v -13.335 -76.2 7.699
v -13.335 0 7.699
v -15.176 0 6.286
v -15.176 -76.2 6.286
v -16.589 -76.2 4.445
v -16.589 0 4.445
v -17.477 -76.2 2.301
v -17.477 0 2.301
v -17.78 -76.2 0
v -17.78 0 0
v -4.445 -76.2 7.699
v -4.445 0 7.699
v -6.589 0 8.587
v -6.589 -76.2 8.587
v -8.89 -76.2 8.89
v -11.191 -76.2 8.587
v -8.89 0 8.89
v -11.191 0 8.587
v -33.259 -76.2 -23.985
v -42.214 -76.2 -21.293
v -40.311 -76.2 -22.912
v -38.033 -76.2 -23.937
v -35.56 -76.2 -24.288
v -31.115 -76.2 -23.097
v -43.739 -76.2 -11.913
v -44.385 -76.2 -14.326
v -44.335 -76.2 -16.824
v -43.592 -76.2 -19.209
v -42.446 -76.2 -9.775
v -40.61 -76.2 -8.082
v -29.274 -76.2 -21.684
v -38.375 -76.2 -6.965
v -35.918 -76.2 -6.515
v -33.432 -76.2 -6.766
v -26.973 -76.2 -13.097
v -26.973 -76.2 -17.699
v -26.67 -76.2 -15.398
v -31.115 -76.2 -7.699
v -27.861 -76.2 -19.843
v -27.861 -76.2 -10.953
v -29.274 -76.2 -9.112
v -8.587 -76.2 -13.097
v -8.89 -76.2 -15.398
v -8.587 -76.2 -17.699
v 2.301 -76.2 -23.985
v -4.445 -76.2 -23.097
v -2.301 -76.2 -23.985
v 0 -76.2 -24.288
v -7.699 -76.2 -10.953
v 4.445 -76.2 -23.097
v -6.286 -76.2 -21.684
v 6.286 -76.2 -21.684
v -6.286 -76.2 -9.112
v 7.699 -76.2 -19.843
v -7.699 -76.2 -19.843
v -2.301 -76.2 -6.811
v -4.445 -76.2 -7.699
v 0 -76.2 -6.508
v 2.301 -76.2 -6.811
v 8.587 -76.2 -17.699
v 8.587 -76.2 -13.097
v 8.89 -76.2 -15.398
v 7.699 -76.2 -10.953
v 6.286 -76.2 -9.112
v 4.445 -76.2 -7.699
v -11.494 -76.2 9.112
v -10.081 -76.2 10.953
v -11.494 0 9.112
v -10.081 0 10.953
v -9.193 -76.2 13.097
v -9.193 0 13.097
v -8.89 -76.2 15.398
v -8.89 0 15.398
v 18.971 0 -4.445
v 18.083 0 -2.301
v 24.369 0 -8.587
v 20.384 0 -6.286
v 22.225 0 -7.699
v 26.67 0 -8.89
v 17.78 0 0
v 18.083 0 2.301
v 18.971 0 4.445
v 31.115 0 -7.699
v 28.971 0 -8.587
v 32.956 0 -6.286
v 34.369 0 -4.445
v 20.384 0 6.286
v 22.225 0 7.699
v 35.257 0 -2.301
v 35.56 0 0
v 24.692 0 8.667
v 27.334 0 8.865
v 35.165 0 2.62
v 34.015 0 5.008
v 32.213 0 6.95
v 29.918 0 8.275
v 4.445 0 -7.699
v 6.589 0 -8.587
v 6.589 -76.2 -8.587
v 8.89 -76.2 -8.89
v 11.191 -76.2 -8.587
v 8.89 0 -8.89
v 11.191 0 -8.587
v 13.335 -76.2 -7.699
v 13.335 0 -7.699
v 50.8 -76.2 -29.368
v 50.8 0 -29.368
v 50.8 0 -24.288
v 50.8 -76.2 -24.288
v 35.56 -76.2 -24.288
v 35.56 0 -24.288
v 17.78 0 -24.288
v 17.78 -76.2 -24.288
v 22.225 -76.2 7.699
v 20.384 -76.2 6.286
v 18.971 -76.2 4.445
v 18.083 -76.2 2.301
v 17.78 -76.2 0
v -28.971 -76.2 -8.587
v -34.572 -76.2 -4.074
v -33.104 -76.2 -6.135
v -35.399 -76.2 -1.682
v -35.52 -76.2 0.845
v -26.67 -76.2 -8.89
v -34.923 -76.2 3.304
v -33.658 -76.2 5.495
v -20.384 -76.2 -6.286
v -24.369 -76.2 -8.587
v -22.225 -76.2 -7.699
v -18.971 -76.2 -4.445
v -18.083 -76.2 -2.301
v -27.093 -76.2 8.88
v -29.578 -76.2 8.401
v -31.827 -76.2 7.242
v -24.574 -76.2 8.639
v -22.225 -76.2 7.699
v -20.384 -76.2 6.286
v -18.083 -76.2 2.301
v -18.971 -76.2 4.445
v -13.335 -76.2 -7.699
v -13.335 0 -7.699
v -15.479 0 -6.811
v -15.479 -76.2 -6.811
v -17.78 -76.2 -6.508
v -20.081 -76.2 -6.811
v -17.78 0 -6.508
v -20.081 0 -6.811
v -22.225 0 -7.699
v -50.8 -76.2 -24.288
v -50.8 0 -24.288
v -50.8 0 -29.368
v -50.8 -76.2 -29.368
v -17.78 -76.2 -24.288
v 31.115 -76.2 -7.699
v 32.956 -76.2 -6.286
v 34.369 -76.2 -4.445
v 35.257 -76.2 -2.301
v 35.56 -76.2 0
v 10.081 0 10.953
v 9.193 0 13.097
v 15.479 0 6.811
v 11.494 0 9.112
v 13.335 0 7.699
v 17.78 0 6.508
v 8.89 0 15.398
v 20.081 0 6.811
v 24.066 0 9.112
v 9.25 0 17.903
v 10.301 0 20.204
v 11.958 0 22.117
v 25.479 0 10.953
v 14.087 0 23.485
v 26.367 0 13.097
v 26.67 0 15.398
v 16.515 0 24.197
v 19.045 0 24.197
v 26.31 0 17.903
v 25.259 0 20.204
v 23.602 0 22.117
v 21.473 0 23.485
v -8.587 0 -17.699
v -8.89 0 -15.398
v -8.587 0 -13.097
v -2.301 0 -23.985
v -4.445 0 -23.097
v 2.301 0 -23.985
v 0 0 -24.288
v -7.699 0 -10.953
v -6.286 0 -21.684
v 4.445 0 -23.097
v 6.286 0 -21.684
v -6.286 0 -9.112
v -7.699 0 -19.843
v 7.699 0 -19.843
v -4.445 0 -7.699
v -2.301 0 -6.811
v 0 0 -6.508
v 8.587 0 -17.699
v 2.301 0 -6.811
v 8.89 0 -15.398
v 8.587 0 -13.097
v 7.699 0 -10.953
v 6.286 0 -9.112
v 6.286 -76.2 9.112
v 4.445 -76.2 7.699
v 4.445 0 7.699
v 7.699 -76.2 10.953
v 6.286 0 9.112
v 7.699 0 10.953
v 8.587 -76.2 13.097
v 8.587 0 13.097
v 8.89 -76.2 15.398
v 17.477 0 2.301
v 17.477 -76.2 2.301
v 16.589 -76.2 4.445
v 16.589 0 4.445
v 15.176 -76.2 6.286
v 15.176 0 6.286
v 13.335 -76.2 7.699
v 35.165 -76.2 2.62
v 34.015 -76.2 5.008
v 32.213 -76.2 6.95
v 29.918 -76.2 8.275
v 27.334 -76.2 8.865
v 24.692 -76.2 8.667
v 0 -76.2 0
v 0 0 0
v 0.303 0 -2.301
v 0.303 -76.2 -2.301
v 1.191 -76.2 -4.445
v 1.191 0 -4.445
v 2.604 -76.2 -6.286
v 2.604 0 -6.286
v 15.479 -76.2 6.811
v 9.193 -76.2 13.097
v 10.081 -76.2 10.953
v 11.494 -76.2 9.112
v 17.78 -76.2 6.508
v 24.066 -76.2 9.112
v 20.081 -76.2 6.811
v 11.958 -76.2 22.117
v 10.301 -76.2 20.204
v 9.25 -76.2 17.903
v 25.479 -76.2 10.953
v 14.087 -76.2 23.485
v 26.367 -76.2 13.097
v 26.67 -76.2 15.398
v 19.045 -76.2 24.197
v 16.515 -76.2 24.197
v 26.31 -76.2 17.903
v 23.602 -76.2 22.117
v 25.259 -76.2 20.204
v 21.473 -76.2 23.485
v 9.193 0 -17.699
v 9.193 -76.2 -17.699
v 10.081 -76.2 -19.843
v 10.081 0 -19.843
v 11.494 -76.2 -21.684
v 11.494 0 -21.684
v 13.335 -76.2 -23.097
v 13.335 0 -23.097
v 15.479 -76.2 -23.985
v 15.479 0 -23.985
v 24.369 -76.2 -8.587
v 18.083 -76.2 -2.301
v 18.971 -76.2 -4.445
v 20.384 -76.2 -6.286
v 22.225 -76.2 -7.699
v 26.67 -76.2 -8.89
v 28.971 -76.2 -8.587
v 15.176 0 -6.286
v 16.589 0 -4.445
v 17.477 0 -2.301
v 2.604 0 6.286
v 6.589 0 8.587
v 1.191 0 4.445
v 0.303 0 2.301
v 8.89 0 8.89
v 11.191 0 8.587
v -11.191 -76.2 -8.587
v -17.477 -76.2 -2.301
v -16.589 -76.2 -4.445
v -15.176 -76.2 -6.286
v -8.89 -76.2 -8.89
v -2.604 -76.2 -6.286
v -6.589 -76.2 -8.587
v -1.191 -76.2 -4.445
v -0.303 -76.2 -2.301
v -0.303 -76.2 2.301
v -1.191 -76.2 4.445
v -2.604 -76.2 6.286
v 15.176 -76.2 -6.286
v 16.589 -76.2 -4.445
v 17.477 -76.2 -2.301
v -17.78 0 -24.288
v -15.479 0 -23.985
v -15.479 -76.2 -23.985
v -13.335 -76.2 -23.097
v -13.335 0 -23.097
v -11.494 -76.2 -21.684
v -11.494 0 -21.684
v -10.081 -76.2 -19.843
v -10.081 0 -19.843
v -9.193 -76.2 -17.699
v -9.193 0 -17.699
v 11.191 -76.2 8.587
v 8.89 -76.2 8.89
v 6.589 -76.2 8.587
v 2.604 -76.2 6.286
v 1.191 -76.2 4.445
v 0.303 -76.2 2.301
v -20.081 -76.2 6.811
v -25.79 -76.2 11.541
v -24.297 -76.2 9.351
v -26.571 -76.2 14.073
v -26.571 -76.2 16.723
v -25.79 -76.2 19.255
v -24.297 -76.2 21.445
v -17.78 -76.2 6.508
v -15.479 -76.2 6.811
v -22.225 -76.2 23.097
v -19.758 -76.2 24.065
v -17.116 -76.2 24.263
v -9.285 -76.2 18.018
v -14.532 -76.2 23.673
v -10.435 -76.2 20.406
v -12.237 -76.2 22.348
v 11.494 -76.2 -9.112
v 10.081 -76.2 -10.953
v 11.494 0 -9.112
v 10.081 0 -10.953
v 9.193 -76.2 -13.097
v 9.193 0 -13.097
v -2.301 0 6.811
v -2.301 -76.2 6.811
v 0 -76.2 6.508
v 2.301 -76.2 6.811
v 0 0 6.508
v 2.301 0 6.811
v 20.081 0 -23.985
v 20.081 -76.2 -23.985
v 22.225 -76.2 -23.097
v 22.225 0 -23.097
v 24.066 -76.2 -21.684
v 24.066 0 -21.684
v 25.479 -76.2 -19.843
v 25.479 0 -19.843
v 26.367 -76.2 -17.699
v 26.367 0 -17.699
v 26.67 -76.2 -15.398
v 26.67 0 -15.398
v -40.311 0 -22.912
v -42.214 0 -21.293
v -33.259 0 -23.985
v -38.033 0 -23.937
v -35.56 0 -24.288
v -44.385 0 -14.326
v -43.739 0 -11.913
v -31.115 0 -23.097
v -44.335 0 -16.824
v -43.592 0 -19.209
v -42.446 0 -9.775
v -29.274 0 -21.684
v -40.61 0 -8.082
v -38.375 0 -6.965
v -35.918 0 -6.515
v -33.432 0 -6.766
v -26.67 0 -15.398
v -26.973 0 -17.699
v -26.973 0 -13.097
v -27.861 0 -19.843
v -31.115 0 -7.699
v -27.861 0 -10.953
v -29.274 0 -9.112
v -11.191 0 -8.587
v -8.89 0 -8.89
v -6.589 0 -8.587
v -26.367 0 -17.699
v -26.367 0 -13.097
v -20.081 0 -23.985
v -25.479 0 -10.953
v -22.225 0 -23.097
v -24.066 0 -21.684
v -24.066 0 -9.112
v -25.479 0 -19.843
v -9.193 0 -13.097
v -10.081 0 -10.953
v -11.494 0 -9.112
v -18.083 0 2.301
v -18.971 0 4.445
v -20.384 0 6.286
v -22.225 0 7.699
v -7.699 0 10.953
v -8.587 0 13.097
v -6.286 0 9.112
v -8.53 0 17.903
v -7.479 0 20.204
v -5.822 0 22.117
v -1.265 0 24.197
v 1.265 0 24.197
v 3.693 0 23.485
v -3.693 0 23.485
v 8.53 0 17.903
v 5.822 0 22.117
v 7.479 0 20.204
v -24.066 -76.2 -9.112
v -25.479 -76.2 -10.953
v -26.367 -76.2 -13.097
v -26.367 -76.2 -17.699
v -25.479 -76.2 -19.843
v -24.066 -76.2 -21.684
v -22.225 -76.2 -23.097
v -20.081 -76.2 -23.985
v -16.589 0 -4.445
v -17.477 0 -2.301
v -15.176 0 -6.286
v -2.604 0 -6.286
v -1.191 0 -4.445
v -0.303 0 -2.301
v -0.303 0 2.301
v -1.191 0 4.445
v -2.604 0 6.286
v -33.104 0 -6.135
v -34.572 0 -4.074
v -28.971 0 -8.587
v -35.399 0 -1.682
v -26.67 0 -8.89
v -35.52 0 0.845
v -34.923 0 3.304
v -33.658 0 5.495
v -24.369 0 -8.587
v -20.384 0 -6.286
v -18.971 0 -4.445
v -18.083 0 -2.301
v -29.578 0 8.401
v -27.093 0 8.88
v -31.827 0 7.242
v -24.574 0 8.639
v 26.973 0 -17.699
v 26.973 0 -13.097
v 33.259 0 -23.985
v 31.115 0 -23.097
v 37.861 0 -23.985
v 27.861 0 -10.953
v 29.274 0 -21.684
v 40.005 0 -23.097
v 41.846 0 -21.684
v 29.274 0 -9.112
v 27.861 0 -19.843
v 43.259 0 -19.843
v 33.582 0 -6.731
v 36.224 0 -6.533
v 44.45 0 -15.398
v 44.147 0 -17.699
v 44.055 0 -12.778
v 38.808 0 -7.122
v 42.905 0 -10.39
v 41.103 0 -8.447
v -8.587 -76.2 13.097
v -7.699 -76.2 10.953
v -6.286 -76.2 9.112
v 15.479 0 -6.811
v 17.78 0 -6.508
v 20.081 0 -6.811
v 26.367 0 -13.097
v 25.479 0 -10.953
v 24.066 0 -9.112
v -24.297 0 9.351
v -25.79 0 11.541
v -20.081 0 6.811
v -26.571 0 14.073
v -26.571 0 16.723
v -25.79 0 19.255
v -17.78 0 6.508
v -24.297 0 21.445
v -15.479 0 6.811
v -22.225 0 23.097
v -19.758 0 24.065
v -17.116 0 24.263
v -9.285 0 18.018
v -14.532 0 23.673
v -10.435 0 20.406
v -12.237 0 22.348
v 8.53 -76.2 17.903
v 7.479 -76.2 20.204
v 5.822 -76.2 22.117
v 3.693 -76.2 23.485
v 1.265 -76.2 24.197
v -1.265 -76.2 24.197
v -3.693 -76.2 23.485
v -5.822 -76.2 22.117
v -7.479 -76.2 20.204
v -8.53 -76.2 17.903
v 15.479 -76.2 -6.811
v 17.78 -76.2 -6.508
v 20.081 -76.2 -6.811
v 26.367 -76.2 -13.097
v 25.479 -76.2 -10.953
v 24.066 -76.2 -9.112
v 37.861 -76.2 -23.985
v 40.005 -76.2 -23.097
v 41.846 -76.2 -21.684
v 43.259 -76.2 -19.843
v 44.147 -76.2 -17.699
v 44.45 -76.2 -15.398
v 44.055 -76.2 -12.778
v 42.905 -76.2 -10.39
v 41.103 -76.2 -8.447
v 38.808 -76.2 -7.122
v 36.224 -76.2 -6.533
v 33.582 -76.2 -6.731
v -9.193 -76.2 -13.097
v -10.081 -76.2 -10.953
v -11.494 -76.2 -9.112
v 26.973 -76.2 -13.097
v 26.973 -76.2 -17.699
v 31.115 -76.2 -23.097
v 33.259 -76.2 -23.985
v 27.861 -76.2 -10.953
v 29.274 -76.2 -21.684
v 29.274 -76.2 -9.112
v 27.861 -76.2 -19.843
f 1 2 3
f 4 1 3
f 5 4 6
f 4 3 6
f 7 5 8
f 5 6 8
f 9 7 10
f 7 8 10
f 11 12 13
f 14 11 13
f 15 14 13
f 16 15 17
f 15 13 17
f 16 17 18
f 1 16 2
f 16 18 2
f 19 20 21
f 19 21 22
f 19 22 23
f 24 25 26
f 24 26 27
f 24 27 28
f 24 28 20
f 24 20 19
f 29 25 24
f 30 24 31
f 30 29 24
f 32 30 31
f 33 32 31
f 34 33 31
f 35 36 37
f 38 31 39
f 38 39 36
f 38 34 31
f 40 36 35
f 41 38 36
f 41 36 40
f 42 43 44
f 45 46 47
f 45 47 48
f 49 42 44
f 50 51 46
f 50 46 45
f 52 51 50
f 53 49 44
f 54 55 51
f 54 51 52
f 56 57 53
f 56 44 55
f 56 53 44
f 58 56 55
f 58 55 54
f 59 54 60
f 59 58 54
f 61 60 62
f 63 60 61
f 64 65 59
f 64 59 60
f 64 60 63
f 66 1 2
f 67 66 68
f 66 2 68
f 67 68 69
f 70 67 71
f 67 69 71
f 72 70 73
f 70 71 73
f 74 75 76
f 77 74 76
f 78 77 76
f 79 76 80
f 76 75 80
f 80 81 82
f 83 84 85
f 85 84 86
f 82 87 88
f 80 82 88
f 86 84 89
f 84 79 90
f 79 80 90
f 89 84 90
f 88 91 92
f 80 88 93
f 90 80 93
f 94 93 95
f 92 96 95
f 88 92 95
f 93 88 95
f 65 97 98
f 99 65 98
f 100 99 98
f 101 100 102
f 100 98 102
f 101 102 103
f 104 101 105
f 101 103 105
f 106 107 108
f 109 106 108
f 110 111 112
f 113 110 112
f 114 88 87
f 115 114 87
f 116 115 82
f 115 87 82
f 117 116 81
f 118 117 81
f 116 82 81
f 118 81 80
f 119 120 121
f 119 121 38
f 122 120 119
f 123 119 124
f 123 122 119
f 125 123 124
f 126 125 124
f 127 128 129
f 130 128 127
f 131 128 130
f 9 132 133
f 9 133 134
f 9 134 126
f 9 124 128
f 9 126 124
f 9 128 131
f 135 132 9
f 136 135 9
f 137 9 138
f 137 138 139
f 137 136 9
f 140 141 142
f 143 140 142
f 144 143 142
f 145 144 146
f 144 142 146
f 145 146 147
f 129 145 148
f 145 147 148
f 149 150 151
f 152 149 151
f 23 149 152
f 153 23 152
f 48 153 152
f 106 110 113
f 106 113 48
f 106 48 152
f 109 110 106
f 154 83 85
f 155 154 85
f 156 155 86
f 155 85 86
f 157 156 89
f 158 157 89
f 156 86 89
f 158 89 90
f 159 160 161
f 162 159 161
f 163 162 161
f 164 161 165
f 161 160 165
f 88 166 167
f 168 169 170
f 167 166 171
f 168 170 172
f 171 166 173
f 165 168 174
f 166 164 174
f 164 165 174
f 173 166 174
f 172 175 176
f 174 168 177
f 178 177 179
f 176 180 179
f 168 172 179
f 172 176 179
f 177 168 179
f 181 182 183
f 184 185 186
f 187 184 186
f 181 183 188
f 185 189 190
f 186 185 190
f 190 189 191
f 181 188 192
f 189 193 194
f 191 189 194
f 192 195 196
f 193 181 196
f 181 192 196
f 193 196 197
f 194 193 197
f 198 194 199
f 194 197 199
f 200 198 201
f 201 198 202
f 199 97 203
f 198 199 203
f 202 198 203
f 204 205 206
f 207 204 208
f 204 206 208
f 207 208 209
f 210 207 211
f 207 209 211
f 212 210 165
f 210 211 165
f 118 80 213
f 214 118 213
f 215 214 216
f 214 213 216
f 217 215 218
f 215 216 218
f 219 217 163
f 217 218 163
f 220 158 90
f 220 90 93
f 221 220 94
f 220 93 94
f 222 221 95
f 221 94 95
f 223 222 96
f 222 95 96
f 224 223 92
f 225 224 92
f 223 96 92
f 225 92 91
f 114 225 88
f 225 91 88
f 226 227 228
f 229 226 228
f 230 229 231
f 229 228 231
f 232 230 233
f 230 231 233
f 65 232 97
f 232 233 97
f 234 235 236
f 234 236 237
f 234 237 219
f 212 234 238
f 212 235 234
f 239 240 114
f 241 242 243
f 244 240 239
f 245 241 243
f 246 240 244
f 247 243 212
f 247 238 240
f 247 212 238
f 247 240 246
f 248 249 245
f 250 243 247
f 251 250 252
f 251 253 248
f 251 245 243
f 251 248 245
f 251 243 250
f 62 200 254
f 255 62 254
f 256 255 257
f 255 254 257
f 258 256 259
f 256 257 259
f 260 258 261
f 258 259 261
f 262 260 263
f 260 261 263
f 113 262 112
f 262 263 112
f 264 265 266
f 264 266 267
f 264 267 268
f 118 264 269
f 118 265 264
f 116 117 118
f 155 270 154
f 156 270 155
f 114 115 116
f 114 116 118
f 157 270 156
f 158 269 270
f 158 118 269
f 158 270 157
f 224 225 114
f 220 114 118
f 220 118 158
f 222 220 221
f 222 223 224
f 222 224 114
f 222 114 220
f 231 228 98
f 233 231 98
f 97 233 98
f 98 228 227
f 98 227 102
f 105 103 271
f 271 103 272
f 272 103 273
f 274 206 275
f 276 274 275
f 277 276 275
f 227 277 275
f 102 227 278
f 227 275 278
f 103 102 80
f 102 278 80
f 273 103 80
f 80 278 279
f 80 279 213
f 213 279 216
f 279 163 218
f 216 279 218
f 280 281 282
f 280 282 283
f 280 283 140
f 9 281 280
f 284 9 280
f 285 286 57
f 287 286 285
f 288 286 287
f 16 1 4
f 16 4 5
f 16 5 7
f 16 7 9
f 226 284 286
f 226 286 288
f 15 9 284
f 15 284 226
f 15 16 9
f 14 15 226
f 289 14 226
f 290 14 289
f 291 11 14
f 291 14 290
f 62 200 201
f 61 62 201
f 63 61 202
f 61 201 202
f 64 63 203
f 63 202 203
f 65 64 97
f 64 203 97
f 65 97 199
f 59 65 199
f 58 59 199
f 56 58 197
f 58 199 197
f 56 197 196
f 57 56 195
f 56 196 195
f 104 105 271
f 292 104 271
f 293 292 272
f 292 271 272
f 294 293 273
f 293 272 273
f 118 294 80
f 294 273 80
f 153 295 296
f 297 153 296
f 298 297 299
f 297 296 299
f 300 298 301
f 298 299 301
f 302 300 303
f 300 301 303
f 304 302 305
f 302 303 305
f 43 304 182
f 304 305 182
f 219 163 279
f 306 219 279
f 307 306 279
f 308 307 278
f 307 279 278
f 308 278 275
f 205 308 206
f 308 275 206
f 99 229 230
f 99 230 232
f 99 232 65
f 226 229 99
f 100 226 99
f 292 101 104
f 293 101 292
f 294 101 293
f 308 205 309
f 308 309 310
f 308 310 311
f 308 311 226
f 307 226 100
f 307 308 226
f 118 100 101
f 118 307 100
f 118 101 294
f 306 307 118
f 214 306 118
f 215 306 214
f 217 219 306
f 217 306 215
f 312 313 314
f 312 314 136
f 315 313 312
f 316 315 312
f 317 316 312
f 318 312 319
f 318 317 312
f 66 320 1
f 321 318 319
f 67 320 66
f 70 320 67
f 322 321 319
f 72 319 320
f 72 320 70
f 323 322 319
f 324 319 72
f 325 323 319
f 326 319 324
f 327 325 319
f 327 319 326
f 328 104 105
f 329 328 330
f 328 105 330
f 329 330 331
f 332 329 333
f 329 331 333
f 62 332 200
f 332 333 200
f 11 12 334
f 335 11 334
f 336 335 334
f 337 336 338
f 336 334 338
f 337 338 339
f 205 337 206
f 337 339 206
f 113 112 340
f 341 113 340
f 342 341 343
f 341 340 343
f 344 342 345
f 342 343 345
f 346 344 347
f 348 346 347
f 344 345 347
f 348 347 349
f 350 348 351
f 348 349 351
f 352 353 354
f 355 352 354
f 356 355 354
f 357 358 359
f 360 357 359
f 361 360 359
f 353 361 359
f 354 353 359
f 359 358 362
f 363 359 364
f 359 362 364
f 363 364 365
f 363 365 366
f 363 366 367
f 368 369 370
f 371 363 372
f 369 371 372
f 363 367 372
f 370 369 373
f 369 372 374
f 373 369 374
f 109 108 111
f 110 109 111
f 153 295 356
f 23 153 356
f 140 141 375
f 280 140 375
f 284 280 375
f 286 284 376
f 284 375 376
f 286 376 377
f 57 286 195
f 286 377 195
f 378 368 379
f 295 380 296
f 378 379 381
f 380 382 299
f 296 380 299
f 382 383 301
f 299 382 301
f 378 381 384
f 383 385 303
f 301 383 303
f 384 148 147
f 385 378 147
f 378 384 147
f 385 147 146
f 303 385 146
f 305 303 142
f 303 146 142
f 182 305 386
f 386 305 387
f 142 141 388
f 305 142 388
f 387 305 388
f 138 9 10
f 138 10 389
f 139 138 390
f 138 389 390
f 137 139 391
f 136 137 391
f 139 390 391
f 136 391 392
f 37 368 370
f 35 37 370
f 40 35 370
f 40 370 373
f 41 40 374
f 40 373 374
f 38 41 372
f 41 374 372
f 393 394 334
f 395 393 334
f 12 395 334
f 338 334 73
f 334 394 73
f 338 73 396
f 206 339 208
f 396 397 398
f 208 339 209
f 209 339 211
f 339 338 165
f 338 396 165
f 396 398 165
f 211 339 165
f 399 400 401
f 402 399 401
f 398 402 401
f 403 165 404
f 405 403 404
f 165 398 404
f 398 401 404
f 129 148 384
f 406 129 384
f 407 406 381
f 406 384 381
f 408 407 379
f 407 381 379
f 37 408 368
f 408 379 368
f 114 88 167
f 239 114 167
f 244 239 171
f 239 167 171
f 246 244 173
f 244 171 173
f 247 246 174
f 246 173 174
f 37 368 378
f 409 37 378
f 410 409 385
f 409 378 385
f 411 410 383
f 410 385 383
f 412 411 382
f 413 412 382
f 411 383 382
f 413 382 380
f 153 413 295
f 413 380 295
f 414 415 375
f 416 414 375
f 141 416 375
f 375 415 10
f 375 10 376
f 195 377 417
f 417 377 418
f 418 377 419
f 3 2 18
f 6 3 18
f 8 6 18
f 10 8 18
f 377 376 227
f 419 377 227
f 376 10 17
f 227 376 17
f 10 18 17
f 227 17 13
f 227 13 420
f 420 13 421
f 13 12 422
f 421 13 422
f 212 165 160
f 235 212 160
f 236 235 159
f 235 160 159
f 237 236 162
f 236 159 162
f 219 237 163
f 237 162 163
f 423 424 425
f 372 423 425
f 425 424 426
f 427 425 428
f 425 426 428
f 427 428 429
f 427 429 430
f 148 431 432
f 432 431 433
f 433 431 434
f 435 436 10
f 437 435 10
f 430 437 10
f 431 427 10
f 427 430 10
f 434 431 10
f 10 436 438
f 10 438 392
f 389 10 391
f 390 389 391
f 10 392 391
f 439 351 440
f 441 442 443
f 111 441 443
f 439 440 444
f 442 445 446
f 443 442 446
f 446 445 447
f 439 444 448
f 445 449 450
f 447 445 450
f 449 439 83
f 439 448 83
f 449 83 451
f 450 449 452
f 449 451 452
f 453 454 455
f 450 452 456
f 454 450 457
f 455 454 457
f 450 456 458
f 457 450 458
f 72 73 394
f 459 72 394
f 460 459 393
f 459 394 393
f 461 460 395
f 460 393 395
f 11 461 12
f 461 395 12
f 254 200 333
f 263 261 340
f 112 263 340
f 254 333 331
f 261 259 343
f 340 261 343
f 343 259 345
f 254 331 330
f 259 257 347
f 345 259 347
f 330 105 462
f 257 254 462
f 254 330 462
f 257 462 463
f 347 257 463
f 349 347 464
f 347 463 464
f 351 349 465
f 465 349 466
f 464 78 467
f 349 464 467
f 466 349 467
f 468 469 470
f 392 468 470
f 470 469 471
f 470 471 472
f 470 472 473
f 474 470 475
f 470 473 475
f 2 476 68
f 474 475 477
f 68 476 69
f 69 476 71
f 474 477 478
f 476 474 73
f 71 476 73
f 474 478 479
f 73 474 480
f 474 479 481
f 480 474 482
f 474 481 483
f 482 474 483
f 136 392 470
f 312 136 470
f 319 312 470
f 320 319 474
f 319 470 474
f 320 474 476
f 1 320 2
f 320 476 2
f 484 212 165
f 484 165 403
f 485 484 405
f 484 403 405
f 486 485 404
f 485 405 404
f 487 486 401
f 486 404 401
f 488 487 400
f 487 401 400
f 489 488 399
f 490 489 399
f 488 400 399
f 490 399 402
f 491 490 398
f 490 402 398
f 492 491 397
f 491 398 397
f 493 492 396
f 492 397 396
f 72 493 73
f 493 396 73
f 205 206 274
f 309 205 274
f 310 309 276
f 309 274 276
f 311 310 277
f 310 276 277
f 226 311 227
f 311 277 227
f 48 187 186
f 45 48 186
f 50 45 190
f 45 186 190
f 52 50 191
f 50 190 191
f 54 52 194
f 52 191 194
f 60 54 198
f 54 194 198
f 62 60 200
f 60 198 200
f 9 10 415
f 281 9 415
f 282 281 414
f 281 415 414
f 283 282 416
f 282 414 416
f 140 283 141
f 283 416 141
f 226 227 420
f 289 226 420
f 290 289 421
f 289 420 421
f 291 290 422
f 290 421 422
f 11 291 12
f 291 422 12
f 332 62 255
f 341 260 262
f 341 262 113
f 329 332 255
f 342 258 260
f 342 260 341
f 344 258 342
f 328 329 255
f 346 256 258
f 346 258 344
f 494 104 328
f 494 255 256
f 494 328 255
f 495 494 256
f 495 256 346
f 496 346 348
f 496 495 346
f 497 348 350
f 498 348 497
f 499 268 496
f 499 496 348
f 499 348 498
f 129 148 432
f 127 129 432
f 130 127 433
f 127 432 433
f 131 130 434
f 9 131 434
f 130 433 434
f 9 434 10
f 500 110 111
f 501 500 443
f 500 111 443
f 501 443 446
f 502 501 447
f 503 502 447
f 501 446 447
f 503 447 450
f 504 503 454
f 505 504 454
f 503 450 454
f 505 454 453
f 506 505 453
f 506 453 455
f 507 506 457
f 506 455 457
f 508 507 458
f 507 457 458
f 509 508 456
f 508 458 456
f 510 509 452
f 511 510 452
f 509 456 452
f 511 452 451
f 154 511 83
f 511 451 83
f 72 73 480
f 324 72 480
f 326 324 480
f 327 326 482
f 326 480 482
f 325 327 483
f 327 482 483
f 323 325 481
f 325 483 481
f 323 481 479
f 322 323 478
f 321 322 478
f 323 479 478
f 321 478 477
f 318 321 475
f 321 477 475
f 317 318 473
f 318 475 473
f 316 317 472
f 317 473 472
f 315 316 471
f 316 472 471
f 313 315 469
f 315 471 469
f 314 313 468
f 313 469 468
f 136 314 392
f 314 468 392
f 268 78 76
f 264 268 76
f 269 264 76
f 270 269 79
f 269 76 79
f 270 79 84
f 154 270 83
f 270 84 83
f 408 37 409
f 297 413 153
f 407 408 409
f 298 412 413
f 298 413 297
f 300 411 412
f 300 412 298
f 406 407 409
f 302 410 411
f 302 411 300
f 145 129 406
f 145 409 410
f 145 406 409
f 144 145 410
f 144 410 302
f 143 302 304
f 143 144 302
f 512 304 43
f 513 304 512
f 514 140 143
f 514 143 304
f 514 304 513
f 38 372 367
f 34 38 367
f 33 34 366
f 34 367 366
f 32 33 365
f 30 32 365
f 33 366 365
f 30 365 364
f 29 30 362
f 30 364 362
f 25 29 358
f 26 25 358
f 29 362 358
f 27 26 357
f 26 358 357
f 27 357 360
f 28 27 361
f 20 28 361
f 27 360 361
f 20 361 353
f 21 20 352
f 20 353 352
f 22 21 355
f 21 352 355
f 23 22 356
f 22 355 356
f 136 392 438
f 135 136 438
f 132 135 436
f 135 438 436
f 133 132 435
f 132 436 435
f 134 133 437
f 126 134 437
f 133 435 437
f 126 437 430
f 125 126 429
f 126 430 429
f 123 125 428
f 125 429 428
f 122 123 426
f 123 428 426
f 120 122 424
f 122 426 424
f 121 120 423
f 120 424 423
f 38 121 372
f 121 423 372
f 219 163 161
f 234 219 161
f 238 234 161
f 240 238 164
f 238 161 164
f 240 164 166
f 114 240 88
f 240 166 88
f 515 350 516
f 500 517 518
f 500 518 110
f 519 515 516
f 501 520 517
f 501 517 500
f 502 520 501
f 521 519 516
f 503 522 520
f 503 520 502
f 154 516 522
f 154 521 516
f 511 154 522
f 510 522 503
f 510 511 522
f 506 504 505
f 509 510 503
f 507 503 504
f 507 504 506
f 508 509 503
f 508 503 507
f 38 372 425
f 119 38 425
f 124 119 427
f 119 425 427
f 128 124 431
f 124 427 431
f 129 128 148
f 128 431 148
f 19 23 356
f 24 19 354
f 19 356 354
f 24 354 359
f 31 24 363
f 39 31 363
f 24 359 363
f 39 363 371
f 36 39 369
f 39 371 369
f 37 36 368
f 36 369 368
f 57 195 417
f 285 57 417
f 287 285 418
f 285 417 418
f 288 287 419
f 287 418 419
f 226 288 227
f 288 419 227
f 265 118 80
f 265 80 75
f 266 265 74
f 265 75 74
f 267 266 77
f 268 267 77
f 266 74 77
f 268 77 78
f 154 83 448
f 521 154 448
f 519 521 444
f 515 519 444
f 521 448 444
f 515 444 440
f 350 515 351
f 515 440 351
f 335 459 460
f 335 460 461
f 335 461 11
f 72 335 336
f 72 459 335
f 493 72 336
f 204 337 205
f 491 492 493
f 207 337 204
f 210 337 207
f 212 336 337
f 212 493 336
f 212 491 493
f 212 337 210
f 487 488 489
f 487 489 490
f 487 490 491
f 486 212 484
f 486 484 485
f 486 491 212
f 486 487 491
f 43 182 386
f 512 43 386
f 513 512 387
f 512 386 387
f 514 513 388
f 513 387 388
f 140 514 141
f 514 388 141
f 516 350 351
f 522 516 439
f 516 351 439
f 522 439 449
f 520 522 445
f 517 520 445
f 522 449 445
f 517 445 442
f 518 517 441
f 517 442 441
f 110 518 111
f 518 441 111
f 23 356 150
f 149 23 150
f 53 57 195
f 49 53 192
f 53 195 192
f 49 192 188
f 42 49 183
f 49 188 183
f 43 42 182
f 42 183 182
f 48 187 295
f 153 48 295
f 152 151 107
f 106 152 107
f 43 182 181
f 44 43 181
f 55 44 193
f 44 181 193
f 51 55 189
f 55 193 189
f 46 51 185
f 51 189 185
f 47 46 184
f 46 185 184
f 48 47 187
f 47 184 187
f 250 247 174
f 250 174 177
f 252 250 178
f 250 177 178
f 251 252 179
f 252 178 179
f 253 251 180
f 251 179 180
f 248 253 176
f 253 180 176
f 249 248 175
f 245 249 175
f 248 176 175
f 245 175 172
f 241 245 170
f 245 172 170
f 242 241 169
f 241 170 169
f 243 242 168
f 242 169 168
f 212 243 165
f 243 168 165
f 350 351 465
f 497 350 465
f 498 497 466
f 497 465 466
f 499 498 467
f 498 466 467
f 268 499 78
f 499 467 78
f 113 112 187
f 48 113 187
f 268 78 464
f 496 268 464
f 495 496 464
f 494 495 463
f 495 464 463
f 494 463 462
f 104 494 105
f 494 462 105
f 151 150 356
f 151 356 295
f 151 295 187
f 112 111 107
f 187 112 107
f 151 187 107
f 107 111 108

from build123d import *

# Parameters (mm, degrees)
F1_DEPTH = 76.2


with BuildPart() as f1:
    # F0 (on Front) → F1 (new body)
    with BuildSketch(Plane.XZ):
        with BuildLine():
            ThreePointArc((-8.89, 15.397932), (-22.225, 23.096898), (-22.225, 7.698966))
            ThreePointArc((-22.225, 7.698966), (-17.78, 6.507932), (-13.335, 7.698966))
            ThreePointArc((-13.335, 7.698966), (-10.081034, 10.952932), (-8.89, 15.397932))
        make_face()
        with BuildLine():
            ThreePointArc((8.89, 15.397932), (0, 24.287932), (-8.89, 15.397932))
            ThreePointArc((-8.89, 15.397932), (-7.698966, 10.952932), (-4.445, 7.698966))
            ThreePointArc((-4.445, 7.698966), (0, 6.507932), (4.445, 7.698966))
            ThreePointArc((4.445, 7.698966), (7.698966, 10.952932), (8.89, 15.397932))
        make_face()
        with BuildLine():
            ThreePointArc((26.67, 15.397932), (17.78, 24.287932), (8.89, 15.397932))
            ThreePointArc((8.89, 15.397932), (10.081034, 10.952932), (13.335, 7.698966))
            ThreePointArc((13.335, 7.698966), (17.78, 6.507932), (22.225, 7.698966))
            ThreePointArc((22.225, 7.698966), (25.478966, 10.952932), (26.67, 15.397932))
        make_face()
        with BuildLine():
            ThreePointArc((35.56, 0), (31.115, 7.698966), (22.225, 7.698966))
            ThreePointArc((22.225, 7.698966), (18.971034, 4.445), (17.78, 0))
            ThreePointArc((17.78, 0), (18.971034, -4.445), (22.225, -7.698966))
            ThreePointArc((22.225, -7.698966), (26.67, -8.89), (31.115, -7.698966))
            ThreePointArc((31.115, -7.698966), (34.368966, -4.445), (35.56, 0))
        make_face()
        with BuildLine():
            ThreePointArc((4.445, 7.698966), (1.191034, 4.445), (0, 0))
            ThreePointArc((0, 0), (1.191034, -4.445), (4.445, -7.698966))
            ThreePointArc((4.445, -7.698966), (8.89, -8.89), (13.335, -7.698966))
            ThreePointArc((13.335, -7.698966), (16.588966, -4.445), (17.78, 0))
            ThreePointArc((17.78, 0), (16.588966, 4.445), (13.335, 7.698966))
            ThreePointArc((13.335, 7.698966), (8.89, 8.89), (4.445, 7.698966))
        make_face()
        with BuildLine():
            ThreePointArc((-13.335, 7.698966), (-16.588966, 4.445), (-17.78, 0))
            ThreePointArc((-17.78, 0), (-16.588966, -4.445), (-13.335, -7.698966))
            ThreePointArc((-13.335, -7.698966), (-8.89, -8.89), (-4.445, -7.698966))
            ThreePointArc((-4.445, -7.698966), (-1.191034, -4.445), (0, 0))
            ThreePointArc((0, 0), (-1.191034, 4.445), (-4.445, 7.698966))
            ThreePointArc((-4.445, 7.698966), (-8.89, 8.89), (-13.335, 7.698966))
        make_face()
        with BuildLine():
            ThreePointArc((-22.225, -7.698966), (-18.971034, -4.445), (-17.78, 0))
            ThreePointArc((-17.78, 0), (-18.971034, 4.445), (-22.225, 7.698966))
            ThreePointArc((-22.225, 7.698966), (-34.368966, 4.445), (-31.115, -7.698966))
            ThreePointArc((-31.115, -7.698966), (-26.67, -8.89), (-22.225, -7.698966))
        make_face()
        with BuildLine():
            ThreePointArc((-26.67, -15.397932), (-27.861034, -10.952932), (-31.115, -7.698966))
            ThreePointArc((-31.115, -7.698966), (-44.147081, -13.09703), (-35.56, -24.287932))
            ThreePointArc((-35.56, -24.287932), (-29.273821, -21.684111), (-26.67, -15.397932))
        make_face()
        with BuildLine():
            ThreePointArc((-13.335, -7.698966), (-17.78, -6.507932), (-22.225, -7.698966))
            ThreePointArc((-22.225, -7.698966), (-25.478966, -10.952932), (-26.67, -15.397932))
            ThreePointArc((-26.67, -15.397932), (-24.066179, -21.684111), (-17.78, -24.287932))
            ThreePointArc((-17.78, -24.287932), (-11.493821, -21.684111), (-8.89, -15.397932))
            ThreePointArc((-8.89, -15.397932), (-10.081034, -10.952932), (-13.335, -7.698966))
        make_face()
        with BuildLine():
            ThreePointArc((4.445, -7.698966), (0, -6.507932), (-4.445, -7.698966))
            ThreePointArc((-4.445, -7.698966), (-7.698966, -10.952932), (-8.89, -15.397932))
            ThreePointArc((-8.89, -15.397932), (-6.286179, -21.684111), (0, -24.287932))
            ThreePointArc((0, -24.287932), (6.286179, -21.684111), (8.89, -15.397932))
            ThreePointArc((8.89, -15.397932), (7.698966, -10.952932), (4.445, -7.698966))
        make_face()
        with BuildLine():
            ThreePointArc((22.225, -7.698966), (17.78, -6.507932), (13.335, -7.698966))
            ThreePointArc((13.335, -7.698966), (10.081034, -10.952932), (8.89, -15.397932))
            ThreePointArc((8.89, -15.397932), (11.493821, -21.684111), (17.78, -24.287932))
            ThreePointArc((17.78, -24.287932), (24.066179, -21.684111), (26.67, -15.397932))
            ThreePointArc((26.67, -15.397932), (25.478966, -10.952932), (22.225, -7.698966))
        make_face()
        with BuildLine():
            ThreePointArc((31.115, -7.698966), (27.861034, -10.952932), (26.67, -15.397932))
            ThreePointArc((26.67, -15.397932), (29.273821, -21.684111), (35.56, -24.287932))
            ThreePointArc((35.56, -24.287932), (41.846179, -21.684111), (44.45, -15.397932))
            ThreePointArc((44.45, -15.397932), (40.005, -7.698966), (31.115, -7.698966))
        make_face()
        Polygon((-17.78, -24.287932), (-35.56, -24.287932), (-50.8, -24.287932), (-50.8, -29.367932), (50.8, -29.367932), (50.8, -24.287932), (35.56, -24.287932), (17.78, -24.287932), (0, -24.287932), align=None)
    extrude(amount=F1_DEPTH)


solid = f1.part
